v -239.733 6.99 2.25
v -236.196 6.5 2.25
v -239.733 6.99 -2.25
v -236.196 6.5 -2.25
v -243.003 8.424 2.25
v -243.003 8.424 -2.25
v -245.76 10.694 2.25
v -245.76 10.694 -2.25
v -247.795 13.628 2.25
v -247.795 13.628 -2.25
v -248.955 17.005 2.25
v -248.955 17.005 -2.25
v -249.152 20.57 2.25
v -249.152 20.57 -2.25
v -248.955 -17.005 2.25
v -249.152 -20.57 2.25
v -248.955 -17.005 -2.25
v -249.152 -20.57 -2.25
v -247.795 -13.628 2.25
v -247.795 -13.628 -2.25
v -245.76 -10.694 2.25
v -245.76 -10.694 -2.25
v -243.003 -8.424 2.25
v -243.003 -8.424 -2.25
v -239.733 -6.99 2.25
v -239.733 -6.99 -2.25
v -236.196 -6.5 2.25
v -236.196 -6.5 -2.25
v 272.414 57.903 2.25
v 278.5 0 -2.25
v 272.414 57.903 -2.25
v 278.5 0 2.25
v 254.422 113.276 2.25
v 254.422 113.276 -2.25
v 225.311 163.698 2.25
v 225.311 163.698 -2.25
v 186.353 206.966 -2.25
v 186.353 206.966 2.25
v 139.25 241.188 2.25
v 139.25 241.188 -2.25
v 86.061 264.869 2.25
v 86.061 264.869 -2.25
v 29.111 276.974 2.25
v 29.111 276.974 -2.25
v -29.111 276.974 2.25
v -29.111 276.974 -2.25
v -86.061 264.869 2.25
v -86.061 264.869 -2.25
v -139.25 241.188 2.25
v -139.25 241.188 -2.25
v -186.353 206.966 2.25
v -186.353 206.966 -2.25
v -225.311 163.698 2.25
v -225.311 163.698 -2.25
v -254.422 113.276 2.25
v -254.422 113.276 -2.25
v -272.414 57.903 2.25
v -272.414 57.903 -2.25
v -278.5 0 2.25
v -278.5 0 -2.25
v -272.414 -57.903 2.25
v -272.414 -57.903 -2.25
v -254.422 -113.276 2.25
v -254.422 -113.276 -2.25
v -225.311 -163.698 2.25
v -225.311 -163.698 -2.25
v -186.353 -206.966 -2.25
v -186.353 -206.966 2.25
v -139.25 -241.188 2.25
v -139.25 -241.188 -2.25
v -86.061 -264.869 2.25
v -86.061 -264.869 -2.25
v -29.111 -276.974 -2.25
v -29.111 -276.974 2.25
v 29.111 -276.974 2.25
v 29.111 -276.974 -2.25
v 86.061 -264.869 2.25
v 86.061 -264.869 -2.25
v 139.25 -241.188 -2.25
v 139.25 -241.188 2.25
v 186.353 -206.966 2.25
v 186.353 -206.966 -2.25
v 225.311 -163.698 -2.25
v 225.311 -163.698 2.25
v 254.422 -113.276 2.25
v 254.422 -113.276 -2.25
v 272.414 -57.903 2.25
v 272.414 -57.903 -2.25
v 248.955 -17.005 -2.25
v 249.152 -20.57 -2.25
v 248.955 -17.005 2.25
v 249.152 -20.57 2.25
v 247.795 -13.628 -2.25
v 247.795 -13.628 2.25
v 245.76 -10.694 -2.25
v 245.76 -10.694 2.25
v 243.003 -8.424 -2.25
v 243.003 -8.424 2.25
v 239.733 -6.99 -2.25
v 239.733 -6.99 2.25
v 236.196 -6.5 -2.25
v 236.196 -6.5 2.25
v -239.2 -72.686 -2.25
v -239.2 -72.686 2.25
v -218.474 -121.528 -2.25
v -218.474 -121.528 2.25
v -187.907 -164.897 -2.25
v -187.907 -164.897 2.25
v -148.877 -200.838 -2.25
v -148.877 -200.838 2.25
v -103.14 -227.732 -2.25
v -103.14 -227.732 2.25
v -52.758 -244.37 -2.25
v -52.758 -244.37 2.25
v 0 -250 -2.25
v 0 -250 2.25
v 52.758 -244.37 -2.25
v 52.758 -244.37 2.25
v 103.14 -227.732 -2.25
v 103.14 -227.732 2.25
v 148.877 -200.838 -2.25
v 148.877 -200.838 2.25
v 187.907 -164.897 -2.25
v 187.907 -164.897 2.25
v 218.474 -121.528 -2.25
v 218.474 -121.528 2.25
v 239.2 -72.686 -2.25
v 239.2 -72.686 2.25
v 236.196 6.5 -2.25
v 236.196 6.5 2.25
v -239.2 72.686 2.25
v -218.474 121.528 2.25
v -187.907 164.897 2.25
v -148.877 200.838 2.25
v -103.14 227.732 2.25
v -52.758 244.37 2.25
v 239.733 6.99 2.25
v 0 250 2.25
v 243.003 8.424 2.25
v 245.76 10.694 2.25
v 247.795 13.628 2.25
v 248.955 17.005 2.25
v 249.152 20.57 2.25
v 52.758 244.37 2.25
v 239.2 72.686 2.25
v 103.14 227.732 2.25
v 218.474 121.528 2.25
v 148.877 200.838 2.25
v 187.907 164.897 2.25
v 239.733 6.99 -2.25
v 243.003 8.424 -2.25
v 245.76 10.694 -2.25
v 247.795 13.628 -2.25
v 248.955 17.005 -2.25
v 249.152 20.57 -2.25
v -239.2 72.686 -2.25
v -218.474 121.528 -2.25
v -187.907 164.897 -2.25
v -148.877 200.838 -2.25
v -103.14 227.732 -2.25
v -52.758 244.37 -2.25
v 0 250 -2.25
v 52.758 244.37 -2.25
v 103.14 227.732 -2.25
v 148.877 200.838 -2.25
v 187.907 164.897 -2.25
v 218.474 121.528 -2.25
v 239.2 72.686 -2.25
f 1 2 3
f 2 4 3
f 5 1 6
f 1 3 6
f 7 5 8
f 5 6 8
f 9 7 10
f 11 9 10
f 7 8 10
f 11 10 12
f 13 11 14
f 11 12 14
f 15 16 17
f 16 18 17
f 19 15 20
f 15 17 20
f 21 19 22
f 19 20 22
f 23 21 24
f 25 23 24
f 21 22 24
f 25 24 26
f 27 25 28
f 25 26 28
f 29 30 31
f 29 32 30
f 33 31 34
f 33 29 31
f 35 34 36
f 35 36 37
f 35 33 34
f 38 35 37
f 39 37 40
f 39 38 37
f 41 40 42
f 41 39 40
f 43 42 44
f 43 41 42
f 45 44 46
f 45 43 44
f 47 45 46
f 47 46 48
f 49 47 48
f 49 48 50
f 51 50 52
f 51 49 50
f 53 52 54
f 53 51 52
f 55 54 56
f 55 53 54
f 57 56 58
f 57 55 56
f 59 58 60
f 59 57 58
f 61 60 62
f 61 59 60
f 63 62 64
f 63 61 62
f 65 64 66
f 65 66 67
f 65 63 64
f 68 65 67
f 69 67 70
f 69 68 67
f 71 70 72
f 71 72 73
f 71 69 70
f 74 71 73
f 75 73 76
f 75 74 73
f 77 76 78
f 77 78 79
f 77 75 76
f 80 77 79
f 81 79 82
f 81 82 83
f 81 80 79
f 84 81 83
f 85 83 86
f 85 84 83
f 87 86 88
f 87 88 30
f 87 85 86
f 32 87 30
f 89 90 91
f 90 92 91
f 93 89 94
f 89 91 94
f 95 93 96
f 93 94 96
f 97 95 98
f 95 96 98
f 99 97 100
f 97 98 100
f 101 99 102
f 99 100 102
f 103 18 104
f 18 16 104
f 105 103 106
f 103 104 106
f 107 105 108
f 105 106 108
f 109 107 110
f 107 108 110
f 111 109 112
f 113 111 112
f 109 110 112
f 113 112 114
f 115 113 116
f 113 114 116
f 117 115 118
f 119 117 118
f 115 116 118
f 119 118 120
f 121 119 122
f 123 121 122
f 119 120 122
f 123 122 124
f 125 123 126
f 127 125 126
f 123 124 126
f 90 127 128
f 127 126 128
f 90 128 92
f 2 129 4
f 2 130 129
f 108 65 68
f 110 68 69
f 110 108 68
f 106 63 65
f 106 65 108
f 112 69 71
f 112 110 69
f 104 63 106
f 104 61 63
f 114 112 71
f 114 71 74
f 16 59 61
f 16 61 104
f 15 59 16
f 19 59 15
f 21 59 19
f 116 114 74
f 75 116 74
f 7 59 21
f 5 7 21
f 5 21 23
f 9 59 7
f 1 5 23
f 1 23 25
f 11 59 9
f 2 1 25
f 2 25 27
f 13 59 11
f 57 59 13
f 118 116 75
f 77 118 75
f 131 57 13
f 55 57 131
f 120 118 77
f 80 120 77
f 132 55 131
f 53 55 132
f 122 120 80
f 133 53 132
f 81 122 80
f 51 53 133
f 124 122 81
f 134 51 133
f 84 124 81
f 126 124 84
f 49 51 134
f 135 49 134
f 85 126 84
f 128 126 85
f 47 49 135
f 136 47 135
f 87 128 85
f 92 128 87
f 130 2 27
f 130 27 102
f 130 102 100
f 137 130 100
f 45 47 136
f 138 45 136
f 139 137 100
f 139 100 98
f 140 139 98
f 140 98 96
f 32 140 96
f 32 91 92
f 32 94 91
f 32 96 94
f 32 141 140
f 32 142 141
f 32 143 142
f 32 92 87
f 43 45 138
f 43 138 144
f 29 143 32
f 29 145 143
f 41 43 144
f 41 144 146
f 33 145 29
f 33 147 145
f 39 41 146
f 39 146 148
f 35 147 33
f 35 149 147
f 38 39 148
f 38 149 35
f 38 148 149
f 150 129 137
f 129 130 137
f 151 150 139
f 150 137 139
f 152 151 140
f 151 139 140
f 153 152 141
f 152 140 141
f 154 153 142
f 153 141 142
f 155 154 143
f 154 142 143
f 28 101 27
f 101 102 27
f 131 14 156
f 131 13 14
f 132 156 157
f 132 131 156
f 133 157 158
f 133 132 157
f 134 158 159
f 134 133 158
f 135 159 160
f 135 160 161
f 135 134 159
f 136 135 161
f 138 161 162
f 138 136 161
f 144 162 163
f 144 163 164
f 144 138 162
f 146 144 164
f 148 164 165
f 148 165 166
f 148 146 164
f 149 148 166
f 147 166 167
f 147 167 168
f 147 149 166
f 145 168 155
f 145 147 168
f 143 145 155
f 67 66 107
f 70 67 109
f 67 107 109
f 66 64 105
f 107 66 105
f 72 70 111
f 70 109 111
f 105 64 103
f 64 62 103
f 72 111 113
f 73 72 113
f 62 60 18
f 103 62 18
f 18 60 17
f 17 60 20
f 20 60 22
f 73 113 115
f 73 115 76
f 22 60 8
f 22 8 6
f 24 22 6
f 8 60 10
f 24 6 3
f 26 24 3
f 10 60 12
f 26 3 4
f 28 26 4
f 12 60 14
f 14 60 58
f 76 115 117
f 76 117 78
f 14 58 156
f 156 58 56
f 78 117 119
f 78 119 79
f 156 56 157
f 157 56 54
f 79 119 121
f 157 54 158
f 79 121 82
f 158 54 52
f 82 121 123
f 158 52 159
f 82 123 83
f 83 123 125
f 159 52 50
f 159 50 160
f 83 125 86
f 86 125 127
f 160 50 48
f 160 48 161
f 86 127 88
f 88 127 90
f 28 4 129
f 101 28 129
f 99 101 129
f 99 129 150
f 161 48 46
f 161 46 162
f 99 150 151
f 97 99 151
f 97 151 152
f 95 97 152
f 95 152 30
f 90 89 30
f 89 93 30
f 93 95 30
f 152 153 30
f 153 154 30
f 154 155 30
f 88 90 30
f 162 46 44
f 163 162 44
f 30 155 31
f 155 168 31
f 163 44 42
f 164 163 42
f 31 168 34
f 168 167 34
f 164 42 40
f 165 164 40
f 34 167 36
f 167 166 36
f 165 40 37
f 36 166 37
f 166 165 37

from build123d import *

# Parameters (mm, degrees)
SKETCH1_R           = 278.5
BOSS_EXTRUDE1_DEPTH = 2.25
FILLET1_R           = 13


with BuildPart() as part:
    # Sketch1 → Boss-Extrude1 (new body, symmetric)
    with BuildSketch(Plane.XY):
        Circle(SKETCH1_R)
        with BuildLine():
            Line((249.915485715, -6.5), (-249.915485715, -6.5))
            ThreePointArc((-249.915485715, -6.5), (0, -250), (249.915485715, -6.5))
        make_face(mode=Mode.SUBTRACT)
        with BuildLine():
            Line((249.915485715, 6.5), (-249.915485715, 6.5))
            ThreePointArc((-249.915485715, 6.5), (0, 250), (249.915485715, 6.5))
        make_face(mode=Mode.SUBTRACT)
    extrude(amount=BOSS_EXTRUDE1_DEPTH, both=True)

    # Fillet1
    fillet1_edges = [part.edges().sort_by_distance(p)[0] for p in [
        (-249.915485715, -6.5, 0),
        (249.915485715, -6.5, 0),
        (249.915485715, 6.5, 0),
        (-249.915485715, 6.5, 0),
    ]]
    fillet(fillet1_edges, radius=FILLET1_R)


solid = part.part
